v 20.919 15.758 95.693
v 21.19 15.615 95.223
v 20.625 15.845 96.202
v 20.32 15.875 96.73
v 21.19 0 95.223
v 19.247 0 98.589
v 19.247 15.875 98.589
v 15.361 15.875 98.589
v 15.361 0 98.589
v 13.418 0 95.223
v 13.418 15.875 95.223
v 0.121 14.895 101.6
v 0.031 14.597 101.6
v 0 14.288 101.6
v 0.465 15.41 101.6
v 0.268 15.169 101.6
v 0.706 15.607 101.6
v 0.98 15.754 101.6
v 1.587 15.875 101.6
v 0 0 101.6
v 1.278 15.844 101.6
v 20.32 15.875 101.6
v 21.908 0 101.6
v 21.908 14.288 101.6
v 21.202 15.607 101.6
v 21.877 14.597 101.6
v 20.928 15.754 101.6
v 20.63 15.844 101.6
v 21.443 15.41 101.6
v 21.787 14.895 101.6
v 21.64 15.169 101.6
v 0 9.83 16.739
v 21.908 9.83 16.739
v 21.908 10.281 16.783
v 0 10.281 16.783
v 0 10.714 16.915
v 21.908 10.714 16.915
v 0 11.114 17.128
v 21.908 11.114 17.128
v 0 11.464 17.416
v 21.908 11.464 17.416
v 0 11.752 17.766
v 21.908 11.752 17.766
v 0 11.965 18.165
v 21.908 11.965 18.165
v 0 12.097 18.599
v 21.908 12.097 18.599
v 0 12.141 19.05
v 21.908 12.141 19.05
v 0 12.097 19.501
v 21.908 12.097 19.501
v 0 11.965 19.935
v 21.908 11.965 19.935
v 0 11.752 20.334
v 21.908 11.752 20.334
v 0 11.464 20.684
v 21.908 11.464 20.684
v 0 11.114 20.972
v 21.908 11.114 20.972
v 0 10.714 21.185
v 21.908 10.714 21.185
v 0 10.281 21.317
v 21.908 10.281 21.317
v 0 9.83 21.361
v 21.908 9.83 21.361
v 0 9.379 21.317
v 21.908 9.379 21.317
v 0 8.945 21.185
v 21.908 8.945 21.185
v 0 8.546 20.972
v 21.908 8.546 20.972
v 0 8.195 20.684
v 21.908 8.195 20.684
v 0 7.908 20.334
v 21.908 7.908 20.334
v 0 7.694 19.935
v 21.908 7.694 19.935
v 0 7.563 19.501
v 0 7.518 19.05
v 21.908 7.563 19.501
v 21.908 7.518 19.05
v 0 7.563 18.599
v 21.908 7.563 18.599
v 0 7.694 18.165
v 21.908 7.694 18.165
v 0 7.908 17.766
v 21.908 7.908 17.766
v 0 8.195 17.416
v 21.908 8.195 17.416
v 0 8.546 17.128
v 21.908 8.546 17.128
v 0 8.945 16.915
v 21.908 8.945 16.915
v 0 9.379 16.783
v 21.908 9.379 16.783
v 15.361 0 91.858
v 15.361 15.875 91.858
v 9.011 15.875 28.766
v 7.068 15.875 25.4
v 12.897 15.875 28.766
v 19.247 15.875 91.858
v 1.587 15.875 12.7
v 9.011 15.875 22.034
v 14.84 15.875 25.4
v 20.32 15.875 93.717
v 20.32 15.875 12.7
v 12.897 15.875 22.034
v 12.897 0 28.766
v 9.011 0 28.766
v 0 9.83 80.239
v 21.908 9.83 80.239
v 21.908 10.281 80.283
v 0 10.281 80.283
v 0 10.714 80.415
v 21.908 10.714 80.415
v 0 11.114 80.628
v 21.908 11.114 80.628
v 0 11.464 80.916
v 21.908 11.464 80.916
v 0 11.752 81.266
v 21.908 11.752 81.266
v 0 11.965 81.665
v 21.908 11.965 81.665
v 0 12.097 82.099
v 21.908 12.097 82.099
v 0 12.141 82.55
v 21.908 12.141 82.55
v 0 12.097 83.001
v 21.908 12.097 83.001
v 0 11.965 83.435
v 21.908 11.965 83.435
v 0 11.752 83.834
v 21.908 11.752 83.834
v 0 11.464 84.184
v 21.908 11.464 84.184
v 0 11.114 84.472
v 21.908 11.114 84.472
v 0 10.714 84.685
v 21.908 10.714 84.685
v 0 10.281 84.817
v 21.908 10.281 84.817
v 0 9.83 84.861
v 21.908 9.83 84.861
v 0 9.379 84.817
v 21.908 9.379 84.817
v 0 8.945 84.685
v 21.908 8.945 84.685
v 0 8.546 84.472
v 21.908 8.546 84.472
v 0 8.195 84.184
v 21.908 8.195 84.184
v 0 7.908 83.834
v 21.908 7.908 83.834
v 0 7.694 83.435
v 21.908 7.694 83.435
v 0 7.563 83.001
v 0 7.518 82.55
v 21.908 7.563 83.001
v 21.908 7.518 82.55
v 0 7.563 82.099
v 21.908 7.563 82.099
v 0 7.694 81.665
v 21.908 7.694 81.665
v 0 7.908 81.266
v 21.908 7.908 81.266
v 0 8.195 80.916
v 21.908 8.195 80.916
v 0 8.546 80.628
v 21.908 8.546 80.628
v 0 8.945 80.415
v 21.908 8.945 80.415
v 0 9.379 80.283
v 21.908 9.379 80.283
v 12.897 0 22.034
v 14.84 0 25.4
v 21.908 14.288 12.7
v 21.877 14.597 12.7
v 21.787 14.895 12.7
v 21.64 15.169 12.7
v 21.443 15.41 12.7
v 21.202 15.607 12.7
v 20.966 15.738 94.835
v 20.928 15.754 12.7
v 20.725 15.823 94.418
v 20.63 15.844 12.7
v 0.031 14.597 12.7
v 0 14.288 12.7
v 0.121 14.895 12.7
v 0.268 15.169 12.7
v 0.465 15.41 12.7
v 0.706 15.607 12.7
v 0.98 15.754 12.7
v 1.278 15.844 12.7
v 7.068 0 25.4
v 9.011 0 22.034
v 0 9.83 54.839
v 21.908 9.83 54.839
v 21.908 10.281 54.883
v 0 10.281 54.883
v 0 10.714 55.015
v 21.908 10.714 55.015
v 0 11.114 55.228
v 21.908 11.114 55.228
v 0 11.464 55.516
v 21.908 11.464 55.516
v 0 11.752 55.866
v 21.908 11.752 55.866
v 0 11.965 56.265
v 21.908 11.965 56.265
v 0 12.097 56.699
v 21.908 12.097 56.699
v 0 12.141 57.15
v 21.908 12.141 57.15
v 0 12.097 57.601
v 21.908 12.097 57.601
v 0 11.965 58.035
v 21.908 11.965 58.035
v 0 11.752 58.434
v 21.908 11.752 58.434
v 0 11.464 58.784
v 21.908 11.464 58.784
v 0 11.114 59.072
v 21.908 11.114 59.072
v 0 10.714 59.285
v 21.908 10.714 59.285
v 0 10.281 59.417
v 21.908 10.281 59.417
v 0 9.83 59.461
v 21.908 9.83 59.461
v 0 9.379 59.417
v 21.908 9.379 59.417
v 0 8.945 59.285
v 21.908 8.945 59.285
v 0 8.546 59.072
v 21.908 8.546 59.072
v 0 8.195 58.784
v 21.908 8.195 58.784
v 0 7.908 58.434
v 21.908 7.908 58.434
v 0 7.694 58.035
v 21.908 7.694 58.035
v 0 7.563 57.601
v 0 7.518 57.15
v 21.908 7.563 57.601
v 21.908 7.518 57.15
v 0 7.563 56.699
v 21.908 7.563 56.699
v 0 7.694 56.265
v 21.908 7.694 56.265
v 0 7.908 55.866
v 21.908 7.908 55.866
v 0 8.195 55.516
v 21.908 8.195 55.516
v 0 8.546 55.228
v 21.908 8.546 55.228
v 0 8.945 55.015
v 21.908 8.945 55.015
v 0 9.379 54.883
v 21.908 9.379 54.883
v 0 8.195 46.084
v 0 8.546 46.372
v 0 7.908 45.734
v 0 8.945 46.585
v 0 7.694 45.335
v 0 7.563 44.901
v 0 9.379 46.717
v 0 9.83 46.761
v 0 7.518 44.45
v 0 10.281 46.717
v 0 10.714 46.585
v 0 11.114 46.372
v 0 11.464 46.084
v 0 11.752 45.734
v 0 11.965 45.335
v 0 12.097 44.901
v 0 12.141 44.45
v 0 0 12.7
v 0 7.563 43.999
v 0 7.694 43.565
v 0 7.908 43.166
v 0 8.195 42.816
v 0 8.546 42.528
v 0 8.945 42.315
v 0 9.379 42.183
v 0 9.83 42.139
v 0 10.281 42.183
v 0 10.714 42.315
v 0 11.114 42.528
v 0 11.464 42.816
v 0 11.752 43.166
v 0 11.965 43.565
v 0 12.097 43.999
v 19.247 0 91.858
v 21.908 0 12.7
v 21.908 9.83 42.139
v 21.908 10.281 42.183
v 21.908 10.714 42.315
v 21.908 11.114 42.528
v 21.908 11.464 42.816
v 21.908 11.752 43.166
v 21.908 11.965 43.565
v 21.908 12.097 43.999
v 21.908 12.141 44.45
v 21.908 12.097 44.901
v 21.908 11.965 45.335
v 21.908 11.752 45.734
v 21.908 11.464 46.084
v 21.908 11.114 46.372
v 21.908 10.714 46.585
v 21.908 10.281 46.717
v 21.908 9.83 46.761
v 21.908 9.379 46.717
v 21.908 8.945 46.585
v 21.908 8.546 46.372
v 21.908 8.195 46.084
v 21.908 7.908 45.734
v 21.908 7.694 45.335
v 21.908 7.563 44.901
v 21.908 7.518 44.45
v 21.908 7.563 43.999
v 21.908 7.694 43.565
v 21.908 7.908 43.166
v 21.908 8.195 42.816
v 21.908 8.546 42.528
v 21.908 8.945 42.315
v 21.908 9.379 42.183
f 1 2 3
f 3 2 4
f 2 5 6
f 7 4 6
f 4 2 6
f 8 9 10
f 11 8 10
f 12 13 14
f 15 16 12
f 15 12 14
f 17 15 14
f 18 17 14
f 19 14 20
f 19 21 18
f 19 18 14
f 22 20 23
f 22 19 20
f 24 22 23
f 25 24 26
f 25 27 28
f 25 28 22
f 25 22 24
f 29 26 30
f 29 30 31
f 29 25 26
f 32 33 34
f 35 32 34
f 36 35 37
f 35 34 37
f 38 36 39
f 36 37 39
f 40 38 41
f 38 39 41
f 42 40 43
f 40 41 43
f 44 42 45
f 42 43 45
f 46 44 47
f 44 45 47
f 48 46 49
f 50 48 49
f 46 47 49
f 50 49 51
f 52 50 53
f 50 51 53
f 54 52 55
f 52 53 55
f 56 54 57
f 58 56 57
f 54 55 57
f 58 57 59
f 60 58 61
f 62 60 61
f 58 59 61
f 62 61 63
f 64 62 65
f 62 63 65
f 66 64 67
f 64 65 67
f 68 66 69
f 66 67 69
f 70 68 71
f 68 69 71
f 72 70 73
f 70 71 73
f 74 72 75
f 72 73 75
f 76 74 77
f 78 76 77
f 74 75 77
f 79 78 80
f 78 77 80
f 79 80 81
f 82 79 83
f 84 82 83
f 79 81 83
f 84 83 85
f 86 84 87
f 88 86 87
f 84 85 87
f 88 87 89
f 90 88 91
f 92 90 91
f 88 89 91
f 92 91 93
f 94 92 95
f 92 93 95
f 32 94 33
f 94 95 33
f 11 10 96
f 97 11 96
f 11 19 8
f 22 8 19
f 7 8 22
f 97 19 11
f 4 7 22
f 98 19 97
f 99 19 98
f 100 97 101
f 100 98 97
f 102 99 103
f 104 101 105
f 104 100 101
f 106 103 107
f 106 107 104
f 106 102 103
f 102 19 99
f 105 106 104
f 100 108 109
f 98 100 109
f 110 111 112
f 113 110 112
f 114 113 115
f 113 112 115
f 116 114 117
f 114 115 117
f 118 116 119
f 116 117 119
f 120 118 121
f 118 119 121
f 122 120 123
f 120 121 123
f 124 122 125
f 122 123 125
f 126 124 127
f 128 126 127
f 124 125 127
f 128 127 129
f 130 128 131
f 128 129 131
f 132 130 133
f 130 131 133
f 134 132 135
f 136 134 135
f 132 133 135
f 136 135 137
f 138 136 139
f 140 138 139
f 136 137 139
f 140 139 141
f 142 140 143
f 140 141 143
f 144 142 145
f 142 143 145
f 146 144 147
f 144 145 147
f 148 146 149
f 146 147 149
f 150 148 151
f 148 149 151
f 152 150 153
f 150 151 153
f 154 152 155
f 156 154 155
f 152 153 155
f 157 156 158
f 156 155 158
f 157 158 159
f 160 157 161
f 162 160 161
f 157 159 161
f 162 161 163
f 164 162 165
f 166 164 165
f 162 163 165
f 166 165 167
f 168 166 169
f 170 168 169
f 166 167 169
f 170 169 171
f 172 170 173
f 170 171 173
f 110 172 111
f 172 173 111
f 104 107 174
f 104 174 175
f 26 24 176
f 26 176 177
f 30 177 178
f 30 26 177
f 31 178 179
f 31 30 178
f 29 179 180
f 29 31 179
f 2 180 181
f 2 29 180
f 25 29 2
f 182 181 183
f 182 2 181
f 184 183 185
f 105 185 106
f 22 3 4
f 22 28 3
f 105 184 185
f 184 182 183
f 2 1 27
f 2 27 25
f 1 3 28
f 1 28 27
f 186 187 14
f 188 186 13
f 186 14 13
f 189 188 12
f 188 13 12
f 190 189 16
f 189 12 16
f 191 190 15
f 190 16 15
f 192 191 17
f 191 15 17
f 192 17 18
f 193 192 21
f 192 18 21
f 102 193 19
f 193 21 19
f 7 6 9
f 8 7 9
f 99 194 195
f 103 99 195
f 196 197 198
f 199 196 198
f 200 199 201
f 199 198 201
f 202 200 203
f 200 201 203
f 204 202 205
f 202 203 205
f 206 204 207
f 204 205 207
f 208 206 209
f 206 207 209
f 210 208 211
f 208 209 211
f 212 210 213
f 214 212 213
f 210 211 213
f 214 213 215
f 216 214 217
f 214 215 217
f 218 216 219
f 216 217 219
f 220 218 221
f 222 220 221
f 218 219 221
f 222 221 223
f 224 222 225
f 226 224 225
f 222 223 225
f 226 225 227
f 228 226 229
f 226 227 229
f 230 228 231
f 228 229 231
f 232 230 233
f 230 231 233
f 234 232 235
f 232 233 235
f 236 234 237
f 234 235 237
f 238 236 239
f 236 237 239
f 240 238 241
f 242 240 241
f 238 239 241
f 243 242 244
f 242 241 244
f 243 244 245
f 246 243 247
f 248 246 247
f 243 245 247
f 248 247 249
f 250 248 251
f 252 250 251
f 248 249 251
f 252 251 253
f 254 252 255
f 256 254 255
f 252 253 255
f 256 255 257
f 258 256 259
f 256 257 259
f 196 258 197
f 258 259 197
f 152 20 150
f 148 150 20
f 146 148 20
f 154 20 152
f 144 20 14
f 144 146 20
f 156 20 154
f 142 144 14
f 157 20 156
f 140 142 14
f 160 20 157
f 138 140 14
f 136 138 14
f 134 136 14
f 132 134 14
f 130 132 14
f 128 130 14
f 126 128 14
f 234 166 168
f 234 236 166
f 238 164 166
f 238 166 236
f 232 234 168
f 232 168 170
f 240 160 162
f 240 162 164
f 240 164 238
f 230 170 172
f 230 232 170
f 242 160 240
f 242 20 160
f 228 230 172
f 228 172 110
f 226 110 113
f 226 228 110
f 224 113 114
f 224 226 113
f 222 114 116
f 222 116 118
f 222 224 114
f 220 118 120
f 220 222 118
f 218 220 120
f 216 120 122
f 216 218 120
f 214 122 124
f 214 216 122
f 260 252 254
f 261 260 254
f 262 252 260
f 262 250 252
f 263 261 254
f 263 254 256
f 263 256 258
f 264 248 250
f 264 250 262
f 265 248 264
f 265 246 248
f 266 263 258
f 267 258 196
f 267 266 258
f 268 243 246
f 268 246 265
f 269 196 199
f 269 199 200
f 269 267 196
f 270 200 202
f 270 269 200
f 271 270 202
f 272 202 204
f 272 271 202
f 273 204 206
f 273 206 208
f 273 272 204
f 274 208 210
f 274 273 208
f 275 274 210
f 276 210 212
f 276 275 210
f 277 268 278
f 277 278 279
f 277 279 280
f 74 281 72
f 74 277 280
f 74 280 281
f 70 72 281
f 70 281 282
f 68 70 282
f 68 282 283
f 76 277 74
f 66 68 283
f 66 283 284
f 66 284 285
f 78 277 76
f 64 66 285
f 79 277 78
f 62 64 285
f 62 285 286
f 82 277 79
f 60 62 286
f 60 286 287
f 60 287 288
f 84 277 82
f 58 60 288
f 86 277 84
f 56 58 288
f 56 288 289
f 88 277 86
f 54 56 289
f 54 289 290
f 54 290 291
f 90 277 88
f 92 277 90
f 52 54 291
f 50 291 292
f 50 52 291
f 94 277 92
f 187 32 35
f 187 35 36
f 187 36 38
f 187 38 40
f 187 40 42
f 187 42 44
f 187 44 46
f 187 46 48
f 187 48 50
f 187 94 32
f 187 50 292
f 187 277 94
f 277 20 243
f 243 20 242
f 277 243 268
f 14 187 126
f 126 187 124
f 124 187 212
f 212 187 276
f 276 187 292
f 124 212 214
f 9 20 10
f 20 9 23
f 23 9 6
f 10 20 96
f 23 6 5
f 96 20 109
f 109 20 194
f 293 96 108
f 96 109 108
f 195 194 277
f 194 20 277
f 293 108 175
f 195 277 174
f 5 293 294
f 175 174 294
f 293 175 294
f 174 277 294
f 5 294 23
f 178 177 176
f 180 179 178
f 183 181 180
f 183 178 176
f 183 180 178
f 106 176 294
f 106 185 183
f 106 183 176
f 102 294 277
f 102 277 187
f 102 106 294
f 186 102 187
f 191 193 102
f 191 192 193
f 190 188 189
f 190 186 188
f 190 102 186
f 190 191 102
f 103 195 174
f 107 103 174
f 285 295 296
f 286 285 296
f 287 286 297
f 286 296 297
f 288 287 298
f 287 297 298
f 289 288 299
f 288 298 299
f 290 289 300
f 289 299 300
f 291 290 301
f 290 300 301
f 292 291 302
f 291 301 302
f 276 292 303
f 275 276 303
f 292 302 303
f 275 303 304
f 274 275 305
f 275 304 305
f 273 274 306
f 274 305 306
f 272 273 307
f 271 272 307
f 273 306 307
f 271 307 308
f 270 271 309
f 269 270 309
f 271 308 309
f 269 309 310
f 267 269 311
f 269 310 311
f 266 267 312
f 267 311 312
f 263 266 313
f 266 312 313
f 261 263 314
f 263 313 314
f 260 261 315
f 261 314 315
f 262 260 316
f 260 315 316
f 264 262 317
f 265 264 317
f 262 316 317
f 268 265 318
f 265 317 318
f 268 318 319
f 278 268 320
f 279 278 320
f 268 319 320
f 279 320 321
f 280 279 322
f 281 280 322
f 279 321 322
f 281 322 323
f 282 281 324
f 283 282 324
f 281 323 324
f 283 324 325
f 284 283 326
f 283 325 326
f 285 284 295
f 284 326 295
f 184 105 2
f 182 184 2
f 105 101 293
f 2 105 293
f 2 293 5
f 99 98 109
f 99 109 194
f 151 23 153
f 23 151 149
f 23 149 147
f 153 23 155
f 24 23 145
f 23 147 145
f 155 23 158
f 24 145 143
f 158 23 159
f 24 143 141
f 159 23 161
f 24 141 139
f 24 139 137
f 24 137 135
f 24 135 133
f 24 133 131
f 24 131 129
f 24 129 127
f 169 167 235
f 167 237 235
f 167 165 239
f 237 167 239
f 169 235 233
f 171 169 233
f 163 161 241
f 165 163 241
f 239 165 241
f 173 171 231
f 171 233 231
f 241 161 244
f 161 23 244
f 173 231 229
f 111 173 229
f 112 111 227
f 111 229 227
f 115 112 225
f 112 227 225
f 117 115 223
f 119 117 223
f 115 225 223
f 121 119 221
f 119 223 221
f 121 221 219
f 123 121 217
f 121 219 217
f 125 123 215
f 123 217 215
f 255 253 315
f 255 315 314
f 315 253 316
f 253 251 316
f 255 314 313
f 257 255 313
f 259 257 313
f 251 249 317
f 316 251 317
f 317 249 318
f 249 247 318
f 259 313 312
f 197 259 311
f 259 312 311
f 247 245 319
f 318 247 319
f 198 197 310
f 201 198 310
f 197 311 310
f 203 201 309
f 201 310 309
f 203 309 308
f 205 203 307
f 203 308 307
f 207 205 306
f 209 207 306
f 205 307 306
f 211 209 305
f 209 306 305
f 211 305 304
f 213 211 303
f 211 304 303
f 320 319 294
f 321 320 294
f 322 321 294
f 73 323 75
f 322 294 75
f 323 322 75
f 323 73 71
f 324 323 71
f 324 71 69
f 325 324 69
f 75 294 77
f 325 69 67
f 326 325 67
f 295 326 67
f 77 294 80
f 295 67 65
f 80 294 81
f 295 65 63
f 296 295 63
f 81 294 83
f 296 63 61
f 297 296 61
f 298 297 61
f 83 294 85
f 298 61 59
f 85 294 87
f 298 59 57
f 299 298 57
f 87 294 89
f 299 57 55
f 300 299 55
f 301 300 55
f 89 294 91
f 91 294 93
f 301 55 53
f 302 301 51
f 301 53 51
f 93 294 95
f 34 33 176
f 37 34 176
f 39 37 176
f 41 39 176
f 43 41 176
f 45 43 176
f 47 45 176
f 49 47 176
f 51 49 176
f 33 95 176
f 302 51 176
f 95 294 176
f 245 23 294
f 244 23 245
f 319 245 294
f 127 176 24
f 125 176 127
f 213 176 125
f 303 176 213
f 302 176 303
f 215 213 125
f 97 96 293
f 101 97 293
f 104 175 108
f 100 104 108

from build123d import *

# Parameters (mm, degrees)
SKETCH1_W           = 21.9075
SKETCH1_H           = 15.875
BOSS_EXTRUDE1_DEPTH = 101.6
FILLET1_R           = 1.5875
SKETCH2_R           = 2.3114
CUT_EXTRUDE2_DEPTH  = 21.9075
CUT_EXTRUDE3_REACH  = 107.14
SKETCH4_W           = 21.9075
SKETCH4_H           = 15.875
CUT_EXTRUDE4_DEPTH  = 12.7


with BuildPart() as part:
    # Sketch1 → Boss-Extrude1 (new body)
    with BuildSketch(Plane.XY):
        with Locations((10.95375, 7.9375)):
            Rectangle(SKETCH1_W, SKETCH1_H)
    extrude(amount=BOSS_EXTRUDE1_DEPTH)

    # Fillet1
    fillet1_edges = [part.edges().sort_by_distance(p)[0] for p in [
        (0, 15.875, 50.8),
        (21.9075, 15.875, 50.8),
    ]]
    fillet(fillet1_edges, radius=FILLET1_R)

    # Sketch2 → Cut-Extrude2 (cut)
    with BuildSketch(Plane(origin=(21.9075, 0, 0), x_dir=(0, 0, -1), z_dir=(1, 0, 0))):
        with Locations((-57.15, 9.8298)):
            Circle(SKETCH2_R)
        with Locations((-44.45, 9.8298)):
            Circle(SKETCH2_R)
        with Locations((-82.55, 9.8298)):
            Circle(SKETCH2_R)
        with Locations((-6.35, 9.8298)):
            Circle(SKETCH2_R)
        with Locations((-19.05, 9.8298)):
            Circle(SKETCH2_R)
    extrude(amount=-CUT_EXTRUDE2_DEPTH, mode=Mode.SUBTRACT)

    # Sketch3 → Cut-Extrude3 (cut, up to next)
    with BuildSketch(Plane.XZ, mode=Mode.PRIVATE) as cut_extrude3_sk1:
        Polygon((19.246822331, 98.58883), (15.360677669, 98.58883), (13.417605338, 95.22333), (15.360677669, 91.85783), (19.246822331, 91.85783), (21.189894662, 95.22333), align=None)
    cut_extrude3_tool1 = extrude(cut_extrude3_sk1.sketch, amount=-CUT_EXTRUDE3_REACH, mode=Mode.PRIVATE) & part.part
    # Sketch3 → Cut-Extrude3 (cut, up to next)
    with BuildSketch(Plane.XZ, mode=Mode.PRIVATE) as cut_extrude3_sk2:
        Polygon((12.896822331, 28.7655), (9.010677669, 28.7655), (7.067605338, 25.4), (9.010677669, 22.0345), (12.896822331, 22.0345), (14.839894662, 25.4), align=None)
    cut_extrude3_tool2 = extrude(cut_extrude3_sk2.sketch, amount=-CUT_EXTRUDE3_REACH, mode=Mode.PRIVATE) & part.part
    add(cut_extrude3_tool1.solids().sort_by_distance((17.30375, 0, 95.22333))[0], mode=Mode.SUBTRACT)
    add(cut_extrude3_tool2.solids().sort_by_distance((10.95375, 0, 25.4))[0], mode=Mode.SUBTRACT)

    # Sketch4 → Cut-Extrude4 (cut)
    with BuildSketch(Plane(origin=(0, 0, 0), x_dir=(-1, 0, 0), z_dir=(0, 0, -1))):
        with Locations((-10.95375, 7.9375)):
            Rectangle(SKETCH4_W, SKETCH4_H)
    extrude(amount=-CUT_EXTRUDE4_DEPTH, mode=Mode.SUBTRACT)


solid = part.part
